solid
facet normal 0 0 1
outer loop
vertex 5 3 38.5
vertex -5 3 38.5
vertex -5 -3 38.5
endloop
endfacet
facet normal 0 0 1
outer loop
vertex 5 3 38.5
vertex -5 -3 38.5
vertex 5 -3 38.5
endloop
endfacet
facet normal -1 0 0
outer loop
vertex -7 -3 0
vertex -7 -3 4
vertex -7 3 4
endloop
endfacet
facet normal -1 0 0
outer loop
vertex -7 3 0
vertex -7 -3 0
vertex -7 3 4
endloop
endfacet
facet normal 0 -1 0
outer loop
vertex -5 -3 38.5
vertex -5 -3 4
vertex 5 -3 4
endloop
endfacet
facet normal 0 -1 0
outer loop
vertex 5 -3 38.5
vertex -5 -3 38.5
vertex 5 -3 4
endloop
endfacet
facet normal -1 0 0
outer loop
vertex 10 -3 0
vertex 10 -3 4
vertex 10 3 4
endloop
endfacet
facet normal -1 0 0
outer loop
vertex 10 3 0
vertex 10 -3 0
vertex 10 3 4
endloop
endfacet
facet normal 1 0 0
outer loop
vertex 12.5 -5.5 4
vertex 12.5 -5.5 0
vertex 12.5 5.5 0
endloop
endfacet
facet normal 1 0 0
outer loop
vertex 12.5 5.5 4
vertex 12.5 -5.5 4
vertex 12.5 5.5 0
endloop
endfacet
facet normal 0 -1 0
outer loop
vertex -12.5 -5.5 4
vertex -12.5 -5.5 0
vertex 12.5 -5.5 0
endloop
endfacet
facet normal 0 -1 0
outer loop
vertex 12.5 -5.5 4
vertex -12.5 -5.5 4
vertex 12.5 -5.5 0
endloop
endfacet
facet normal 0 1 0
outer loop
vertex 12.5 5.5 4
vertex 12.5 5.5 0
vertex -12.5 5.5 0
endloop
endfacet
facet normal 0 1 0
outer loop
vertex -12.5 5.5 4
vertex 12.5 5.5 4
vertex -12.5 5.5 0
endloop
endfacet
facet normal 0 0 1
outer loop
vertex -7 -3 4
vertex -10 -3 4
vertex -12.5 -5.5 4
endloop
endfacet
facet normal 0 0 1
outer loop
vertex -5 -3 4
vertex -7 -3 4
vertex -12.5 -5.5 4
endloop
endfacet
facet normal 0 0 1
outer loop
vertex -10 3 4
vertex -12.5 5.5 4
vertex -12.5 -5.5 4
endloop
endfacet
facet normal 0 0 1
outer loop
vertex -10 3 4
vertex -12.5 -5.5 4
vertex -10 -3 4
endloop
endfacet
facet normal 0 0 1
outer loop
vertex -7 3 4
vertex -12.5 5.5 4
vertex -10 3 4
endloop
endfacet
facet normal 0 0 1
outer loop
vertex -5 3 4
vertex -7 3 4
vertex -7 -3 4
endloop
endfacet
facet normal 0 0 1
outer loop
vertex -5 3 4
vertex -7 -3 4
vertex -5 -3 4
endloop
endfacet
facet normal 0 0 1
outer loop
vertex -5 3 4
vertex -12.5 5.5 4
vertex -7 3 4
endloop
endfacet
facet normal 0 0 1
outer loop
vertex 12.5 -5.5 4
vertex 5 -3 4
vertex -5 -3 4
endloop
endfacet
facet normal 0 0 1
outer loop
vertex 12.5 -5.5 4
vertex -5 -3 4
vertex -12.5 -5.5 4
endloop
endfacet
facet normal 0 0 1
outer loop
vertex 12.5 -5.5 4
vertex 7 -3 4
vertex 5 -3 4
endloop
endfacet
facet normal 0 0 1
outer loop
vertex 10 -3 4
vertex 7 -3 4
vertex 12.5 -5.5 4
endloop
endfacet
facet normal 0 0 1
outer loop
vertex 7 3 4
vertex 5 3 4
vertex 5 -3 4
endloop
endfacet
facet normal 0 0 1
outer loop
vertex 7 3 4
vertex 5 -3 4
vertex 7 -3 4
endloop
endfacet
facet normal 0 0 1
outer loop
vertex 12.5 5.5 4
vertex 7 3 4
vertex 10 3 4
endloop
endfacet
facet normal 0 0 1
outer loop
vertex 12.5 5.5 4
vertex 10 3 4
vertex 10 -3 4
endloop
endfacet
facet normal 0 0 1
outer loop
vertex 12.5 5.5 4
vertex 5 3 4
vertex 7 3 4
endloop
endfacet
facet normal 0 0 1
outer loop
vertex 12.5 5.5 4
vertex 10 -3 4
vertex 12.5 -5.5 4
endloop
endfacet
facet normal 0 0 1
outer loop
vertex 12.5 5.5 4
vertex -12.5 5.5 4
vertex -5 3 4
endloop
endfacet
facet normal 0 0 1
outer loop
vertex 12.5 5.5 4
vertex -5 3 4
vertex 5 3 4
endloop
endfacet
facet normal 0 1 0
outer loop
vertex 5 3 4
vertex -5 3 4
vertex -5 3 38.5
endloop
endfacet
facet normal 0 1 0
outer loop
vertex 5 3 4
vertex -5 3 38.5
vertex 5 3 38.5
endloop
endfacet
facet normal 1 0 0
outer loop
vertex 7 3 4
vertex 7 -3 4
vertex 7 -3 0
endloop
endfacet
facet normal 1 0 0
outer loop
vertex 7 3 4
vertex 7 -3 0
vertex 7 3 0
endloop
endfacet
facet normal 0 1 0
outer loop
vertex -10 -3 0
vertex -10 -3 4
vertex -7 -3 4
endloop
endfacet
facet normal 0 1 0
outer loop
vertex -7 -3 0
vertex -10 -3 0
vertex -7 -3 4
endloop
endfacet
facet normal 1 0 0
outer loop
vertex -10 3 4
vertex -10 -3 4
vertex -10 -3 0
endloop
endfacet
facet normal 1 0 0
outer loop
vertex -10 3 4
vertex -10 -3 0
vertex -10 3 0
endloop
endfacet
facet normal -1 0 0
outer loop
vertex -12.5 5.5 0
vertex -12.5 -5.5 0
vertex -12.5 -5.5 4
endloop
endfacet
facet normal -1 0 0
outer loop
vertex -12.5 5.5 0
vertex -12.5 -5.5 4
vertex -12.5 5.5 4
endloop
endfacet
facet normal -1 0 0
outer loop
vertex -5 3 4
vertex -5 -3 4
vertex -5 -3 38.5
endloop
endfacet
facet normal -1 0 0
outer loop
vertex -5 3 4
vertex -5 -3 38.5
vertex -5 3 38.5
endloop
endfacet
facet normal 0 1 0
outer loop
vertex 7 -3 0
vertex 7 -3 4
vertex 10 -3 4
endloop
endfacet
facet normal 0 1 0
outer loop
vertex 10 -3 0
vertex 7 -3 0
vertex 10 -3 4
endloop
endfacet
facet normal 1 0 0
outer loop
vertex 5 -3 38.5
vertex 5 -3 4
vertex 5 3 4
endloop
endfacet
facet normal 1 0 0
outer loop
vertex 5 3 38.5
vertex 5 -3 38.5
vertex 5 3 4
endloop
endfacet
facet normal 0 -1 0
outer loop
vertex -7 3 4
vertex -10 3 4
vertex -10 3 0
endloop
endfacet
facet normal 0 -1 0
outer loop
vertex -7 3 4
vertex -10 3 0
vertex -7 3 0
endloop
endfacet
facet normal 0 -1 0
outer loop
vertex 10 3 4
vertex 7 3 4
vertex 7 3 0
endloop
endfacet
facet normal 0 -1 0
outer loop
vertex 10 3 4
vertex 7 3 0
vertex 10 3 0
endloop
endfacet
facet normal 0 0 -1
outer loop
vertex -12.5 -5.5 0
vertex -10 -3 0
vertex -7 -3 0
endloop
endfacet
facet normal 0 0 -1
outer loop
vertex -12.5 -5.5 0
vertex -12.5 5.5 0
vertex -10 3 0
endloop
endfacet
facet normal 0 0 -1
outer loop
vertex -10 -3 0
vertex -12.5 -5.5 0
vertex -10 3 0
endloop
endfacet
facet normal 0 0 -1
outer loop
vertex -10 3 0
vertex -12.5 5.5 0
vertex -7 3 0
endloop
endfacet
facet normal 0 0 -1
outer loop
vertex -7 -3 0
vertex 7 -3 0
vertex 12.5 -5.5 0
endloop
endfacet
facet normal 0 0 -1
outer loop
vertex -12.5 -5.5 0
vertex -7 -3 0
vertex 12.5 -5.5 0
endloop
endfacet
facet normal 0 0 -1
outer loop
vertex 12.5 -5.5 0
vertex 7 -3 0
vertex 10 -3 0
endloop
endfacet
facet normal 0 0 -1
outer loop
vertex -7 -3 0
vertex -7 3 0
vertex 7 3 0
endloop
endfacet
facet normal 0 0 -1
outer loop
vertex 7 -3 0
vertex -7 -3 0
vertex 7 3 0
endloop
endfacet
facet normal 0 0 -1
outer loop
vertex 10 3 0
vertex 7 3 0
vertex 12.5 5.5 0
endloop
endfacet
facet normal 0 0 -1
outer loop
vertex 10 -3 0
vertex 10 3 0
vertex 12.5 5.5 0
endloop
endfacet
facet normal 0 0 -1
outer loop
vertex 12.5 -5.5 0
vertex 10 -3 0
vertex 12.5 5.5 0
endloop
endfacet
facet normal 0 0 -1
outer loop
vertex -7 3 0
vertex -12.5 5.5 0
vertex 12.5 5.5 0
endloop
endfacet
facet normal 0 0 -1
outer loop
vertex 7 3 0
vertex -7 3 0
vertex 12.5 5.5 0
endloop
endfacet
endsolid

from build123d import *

# Parameters (mm, degrees)
F0_W     = 15
F0_H     = 11
F1_DEPTH = 4
F2_W     = 10
F2_H     = 6
F3_DEPTH = 34.5
F0_W_2   = 5
F4_DEPTH = 4
F5_W     = 3
F5_H     = 6
F6_DEPTH = 4


with BuildPart() as f1:
    # F0 (on Top) → F1 (new body)
    with BuildSketch(Plane.XY):
        Rectangle(F0_W, F0_H)
    extrude(amount=F1_DEPTH)

    # F2 (on face) → F3 (join)
    with BuildSketch(Plane.XY.offset(4)):
        Rectangle(F2_W, F2_H)
    extrude(amount=F3_DEPTH)

    # F0 (on Top) → F4 (join)
    with BuildSketch(Plane.XY):
        Rectangle(F0_W, F0_H)
        with Locations((10, 0)):
            Rectangle(F0_W_2, F0_H)
        with Locations((-10, 0)):
            Rectangle(F0_W_2, F0_H)
    extrude(amount=F4_DEPTH)

    # F5 (on face) → F6 (cut)
    with BuildSketch(Plane.XY.offset(4)):
        with Locations((-8.5, 0)):
            Rectangle(F5_W, F5_H)
        with Locations((8.5, 0)):
            Rectangle(F5_W, F5_H)
    extrude(amount=-F6_DEPTH, mode=Mode.SUBTRACT)


solid = f1.part
